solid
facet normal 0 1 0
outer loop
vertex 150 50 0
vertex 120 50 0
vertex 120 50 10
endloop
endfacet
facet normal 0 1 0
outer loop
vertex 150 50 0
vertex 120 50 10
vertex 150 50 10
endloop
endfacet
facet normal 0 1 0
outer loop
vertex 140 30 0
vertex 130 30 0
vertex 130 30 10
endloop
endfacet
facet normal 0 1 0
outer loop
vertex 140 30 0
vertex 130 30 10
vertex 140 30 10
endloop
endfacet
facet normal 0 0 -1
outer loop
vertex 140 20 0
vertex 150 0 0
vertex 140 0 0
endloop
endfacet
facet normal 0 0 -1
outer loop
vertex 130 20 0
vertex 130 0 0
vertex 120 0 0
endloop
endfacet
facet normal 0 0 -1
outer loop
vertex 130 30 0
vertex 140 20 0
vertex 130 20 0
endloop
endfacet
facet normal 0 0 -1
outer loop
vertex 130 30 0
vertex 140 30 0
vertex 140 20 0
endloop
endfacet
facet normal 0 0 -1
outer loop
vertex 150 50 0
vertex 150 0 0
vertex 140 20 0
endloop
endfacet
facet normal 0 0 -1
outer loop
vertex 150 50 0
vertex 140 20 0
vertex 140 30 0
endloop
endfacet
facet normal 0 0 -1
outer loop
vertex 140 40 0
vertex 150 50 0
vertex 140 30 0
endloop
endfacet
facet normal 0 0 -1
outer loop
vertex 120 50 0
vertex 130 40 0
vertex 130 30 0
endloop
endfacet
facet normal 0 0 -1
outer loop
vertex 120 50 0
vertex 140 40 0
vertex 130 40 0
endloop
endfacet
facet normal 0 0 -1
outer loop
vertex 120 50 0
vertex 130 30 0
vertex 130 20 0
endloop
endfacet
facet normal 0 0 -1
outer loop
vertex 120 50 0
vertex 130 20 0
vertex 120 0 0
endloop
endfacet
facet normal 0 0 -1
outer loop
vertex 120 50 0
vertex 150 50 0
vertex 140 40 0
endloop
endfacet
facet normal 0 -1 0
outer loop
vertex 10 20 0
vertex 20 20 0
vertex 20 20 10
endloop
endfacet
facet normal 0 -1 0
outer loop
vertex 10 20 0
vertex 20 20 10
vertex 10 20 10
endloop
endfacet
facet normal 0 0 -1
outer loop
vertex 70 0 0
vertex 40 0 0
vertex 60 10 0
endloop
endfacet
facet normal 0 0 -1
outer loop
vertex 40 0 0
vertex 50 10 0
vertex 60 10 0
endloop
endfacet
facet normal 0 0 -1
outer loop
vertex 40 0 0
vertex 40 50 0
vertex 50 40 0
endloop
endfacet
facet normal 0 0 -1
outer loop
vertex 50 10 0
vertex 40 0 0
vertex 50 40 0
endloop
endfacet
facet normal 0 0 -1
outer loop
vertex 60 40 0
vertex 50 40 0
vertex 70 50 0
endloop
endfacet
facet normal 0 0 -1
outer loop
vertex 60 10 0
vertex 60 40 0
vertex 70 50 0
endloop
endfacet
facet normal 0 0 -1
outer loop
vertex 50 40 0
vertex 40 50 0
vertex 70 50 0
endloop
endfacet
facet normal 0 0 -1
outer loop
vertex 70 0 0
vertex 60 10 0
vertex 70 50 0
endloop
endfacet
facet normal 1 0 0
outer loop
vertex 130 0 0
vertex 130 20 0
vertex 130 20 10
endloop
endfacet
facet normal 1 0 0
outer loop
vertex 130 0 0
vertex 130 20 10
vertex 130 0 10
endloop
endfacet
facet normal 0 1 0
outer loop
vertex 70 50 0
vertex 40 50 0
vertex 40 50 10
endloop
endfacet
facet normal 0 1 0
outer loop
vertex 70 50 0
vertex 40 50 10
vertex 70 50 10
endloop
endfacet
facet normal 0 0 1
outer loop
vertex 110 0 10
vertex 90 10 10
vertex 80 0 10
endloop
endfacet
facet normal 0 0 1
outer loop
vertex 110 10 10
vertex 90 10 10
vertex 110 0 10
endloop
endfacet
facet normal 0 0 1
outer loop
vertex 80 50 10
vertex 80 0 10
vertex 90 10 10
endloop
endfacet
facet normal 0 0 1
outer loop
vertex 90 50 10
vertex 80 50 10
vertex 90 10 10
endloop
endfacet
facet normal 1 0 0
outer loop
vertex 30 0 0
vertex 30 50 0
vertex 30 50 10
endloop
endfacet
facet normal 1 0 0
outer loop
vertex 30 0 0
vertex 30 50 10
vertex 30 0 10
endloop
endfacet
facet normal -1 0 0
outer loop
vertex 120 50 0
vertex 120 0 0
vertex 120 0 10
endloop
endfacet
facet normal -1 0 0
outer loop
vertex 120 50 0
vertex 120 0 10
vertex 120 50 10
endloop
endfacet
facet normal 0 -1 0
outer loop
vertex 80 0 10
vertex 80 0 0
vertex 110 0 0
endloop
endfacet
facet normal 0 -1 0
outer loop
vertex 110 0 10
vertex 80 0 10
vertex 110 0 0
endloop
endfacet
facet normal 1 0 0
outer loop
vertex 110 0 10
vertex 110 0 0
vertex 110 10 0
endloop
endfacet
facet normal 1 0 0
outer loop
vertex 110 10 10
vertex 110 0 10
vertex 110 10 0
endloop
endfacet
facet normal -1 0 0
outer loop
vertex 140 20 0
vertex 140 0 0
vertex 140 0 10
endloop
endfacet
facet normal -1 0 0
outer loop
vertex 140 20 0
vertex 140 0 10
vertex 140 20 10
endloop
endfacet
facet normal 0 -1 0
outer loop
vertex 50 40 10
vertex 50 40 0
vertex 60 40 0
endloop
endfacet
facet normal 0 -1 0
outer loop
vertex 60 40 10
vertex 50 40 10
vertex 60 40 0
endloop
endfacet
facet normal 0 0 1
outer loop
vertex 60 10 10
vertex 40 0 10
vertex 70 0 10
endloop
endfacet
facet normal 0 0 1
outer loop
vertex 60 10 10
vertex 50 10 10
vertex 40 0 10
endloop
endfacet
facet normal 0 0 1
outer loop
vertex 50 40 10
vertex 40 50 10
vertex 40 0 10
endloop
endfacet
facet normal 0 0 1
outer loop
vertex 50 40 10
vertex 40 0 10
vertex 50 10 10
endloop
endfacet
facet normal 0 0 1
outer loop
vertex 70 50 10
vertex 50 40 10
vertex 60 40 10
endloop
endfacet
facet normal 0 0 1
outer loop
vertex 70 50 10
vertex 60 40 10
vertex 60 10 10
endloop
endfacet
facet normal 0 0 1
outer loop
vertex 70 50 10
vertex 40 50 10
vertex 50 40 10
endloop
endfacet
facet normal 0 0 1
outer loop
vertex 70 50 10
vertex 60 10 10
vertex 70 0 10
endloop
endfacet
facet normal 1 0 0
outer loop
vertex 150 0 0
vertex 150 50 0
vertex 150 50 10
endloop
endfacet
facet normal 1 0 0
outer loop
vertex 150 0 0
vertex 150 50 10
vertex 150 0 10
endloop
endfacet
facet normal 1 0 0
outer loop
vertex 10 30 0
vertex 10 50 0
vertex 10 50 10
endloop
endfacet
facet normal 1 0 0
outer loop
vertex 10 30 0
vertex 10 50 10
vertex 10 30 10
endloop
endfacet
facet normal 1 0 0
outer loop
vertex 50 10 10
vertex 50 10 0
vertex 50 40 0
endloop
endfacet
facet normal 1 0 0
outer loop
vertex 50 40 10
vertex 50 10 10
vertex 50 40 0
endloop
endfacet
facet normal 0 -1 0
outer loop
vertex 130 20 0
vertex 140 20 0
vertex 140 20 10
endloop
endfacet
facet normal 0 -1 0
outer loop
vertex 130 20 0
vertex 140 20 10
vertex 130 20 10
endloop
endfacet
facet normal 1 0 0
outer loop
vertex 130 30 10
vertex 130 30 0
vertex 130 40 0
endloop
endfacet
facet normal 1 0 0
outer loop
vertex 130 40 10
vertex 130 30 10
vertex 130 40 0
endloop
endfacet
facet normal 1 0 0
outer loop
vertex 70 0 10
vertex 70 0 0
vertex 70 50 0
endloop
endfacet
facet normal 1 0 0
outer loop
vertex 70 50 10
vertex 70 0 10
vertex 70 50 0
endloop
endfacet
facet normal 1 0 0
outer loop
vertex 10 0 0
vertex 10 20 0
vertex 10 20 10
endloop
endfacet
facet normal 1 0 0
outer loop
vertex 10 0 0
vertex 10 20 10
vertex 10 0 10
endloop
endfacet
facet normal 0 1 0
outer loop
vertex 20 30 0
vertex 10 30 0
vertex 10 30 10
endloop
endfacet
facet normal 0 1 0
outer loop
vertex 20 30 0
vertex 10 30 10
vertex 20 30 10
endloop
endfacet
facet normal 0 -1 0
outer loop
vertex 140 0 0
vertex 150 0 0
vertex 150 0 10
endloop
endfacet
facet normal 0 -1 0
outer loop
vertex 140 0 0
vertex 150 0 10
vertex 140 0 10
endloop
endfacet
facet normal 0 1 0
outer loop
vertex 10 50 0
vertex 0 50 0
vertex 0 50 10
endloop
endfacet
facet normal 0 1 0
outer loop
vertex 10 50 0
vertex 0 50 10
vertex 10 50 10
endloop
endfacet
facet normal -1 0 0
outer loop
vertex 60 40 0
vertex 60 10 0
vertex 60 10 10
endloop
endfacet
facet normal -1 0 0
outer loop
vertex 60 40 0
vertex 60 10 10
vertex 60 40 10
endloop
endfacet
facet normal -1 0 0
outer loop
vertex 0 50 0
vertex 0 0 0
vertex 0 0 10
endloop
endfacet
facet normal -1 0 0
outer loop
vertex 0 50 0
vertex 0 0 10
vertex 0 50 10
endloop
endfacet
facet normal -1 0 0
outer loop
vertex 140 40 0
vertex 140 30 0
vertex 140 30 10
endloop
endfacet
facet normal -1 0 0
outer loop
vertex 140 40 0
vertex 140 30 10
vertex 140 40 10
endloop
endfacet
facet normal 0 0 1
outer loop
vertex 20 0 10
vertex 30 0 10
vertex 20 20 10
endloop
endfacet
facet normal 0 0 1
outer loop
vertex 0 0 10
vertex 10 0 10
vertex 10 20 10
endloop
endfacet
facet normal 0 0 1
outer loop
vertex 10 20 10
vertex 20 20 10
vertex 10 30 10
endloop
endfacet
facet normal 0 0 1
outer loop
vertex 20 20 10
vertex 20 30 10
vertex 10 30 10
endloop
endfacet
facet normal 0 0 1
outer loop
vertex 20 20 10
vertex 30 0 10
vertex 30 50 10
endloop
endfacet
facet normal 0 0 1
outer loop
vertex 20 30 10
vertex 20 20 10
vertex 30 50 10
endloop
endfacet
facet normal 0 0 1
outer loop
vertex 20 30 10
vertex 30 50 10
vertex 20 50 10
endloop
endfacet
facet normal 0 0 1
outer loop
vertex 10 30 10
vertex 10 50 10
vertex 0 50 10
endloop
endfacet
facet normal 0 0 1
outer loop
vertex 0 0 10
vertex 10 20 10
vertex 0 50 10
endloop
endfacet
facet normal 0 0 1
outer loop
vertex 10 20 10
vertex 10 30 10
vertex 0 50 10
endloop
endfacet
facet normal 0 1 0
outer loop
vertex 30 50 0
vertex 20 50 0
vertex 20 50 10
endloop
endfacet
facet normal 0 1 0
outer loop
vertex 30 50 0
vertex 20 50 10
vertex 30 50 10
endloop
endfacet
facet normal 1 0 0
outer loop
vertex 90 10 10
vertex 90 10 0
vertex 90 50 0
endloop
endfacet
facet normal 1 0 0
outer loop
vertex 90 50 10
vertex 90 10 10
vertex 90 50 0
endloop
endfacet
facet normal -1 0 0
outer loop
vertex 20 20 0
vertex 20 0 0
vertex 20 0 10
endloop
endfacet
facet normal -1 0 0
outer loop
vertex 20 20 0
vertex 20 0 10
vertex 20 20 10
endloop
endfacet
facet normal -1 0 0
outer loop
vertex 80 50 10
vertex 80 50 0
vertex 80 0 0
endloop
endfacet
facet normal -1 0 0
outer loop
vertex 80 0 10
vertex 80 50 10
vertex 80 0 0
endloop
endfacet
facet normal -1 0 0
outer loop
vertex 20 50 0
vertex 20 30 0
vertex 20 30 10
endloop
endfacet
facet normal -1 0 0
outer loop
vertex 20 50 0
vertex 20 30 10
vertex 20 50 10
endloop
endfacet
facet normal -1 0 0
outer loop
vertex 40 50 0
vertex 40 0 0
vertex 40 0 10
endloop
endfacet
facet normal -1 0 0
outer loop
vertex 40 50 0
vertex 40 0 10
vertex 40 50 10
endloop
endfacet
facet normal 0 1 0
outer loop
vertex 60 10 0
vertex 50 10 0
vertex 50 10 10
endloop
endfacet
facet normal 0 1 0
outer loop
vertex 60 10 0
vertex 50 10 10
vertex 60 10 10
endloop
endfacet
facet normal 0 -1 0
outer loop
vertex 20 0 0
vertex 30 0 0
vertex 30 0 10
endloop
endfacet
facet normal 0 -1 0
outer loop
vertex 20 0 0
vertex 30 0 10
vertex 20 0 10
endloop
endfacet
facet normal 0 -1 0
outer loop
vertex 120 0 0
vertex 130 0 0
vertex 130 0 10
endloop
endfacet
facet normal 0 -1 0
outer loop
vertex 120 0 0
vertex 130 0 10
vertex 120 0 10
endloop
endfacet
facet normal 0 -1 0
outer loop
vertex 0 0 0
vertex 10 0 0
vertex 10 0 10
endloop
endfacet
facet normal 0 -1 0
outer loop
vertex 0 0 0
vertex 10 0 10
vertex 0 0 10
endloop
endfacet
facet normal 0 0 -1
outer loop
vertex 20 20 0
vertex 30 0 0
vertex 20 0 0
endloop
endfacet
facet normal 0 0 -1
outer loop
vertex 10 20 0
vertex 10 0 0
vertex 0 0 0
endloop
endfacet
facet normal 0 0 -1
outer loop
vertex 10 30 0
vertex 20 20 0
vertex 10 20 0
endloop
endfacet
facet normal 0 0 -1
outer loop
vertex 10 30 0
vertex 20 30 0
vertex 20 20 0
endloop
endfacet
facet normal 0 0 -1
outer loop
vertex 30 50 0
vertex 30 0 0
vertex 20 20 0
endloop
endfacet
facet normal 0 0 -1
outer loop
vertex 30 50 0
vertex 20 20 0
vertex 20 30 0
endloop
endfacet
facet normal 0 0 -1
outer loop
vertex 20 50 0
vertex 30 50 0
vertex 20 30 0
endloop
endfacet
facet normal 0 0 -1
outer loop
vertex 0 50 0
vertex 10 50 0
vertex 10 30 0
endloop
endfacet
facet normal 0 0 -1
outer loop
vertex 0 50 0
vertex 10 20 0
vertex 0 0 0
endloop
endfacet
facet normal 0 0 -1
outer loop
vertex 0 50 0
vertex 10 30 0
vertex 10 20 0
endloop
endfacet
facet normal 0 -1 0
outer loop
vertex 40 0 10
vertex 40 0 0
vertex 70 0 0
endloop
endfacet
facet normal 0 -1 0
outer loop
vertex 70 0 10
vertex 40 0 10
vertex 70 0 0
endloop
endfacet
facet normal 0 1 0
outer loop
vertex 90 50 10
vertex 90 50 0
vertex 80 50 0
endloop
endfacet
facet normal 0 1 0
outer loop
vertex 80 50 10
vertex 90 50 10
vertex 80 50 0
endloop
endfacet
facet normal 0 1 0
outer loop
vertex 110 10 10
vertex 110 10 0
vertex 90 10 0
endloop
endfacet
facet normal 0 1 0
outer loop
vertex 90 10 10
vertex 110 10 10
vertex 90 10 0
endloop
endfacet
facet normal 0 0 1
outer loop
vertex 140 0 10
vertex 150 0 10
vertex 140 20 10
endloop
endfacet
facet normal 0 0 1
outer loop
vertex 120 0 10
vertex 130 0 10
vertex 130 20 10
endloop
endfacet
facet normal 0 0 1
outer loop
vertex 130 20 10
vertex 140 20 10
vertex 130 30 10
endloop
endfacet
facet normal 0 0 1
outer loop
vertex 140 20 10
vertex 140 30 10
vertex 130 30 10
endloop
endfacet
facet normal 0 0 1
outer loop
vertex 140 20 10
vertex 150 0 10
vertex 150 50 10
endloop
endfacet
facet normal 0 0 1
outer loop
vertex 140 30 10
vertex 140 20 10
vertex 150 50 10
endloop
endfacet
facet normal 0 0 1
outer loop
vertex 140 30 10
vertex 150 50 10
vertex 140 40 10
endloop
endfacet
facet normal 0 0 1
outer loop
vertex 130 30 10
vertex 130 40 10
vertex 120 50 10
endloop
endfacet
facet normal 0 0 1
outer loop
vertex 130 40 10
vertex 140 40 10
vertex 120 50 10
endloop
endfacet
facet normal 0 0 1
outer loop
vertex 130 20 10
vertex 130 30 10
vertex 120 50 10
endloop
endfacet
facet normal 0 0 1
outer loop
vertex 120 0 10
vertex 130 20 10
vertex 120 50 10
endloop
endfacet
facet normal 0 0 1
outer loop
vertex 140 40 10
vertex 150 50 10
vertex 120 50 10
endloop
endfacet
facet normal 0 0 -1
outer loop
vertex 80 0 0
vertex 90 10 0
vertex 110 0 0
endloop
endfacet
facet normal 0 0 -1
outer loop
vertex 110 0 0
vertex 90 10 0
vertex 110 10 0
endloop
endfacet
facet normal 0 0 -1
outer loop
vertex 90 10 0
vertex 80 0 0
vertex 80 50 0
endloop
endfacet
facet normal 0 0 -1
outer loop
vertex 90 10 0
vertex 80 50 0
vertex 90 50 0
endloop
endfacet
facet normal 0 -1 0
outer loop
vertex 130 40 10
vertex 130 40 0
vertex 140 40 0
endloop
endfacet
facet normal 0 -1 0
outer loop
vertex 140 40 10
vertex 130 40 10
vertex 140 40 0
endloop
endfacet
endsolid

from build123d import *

# Parameters (mm, degrees)
PAD002_DEPTH  = 10
SKETCH001_W   = 30
SKETCH001_H   = 50
SKETCH001_W_2 = 10
SKETCH001_H_2 = 30
PAD001_DEPTH  = 10
PAD003_DEPTH  = 10
SKETCH003_W   = 10
SKETCH003_H   = 10
PAD_DEPTH     = 10


with BuildPart() as h001:
    # Sketch → Pad002 (new body)
    with BuildSketch(Plane.XY):
        Polygon((0, 0), (0, 50), (10, 50), (10, 30), (20, 30), (20, 50), (30, 50), (30, 0), (20, 0), (20, 20), (10, 20), (10, 0), align=None)
    extrude(amount=PAD002_DEPTH)


with BuildPart() as o001:
    # Sketch001 → Pad001 (new body)
    with BuildSketch(Plane.XY):
        with Locations((55, 25)):
            Rectangle(SKETCH001_W, SKETCH001_H)
        with Locations((55, 25)):
            Rectangle(SKETCH001_W_2, SKETCH001_H_2, mode=Mode.SUBTRACT)
    extrude(amount=PAD001_DEPTH)


with BuildPart() as l001:
    # Sketch002 → Pad003 (new body)
    with BuildSketch(Plane.XY):
        Polygon((80, 50), (80, 0), (110, 0), (110, 10), (90, 10), (90, 50), align=None)
    extrude(amount=PAD003_DEPTH)


with BuildPart() as a001:
    # Sketch003 → Pad (new body)
    with BuildSketch(Plane(origin=(120, 0, 0), x_dir=(1, 0, 0), z_dir=(0, 0, 1))):
        Polygon((0, 0), (0, 50), (30, 50), (30, 0), (20, 0), (20, 20), (10, 20), (10, 0), align=None)
        with Locations((15, 35)):
            Rectangle(SKETCH003_W, SKETCH003_H, mode=Mode.SUBTRACT)
    extrude(amount=PAD_DEPTH)


solid = Compound([h001.part, o001.part, l001.part, a001.part])
